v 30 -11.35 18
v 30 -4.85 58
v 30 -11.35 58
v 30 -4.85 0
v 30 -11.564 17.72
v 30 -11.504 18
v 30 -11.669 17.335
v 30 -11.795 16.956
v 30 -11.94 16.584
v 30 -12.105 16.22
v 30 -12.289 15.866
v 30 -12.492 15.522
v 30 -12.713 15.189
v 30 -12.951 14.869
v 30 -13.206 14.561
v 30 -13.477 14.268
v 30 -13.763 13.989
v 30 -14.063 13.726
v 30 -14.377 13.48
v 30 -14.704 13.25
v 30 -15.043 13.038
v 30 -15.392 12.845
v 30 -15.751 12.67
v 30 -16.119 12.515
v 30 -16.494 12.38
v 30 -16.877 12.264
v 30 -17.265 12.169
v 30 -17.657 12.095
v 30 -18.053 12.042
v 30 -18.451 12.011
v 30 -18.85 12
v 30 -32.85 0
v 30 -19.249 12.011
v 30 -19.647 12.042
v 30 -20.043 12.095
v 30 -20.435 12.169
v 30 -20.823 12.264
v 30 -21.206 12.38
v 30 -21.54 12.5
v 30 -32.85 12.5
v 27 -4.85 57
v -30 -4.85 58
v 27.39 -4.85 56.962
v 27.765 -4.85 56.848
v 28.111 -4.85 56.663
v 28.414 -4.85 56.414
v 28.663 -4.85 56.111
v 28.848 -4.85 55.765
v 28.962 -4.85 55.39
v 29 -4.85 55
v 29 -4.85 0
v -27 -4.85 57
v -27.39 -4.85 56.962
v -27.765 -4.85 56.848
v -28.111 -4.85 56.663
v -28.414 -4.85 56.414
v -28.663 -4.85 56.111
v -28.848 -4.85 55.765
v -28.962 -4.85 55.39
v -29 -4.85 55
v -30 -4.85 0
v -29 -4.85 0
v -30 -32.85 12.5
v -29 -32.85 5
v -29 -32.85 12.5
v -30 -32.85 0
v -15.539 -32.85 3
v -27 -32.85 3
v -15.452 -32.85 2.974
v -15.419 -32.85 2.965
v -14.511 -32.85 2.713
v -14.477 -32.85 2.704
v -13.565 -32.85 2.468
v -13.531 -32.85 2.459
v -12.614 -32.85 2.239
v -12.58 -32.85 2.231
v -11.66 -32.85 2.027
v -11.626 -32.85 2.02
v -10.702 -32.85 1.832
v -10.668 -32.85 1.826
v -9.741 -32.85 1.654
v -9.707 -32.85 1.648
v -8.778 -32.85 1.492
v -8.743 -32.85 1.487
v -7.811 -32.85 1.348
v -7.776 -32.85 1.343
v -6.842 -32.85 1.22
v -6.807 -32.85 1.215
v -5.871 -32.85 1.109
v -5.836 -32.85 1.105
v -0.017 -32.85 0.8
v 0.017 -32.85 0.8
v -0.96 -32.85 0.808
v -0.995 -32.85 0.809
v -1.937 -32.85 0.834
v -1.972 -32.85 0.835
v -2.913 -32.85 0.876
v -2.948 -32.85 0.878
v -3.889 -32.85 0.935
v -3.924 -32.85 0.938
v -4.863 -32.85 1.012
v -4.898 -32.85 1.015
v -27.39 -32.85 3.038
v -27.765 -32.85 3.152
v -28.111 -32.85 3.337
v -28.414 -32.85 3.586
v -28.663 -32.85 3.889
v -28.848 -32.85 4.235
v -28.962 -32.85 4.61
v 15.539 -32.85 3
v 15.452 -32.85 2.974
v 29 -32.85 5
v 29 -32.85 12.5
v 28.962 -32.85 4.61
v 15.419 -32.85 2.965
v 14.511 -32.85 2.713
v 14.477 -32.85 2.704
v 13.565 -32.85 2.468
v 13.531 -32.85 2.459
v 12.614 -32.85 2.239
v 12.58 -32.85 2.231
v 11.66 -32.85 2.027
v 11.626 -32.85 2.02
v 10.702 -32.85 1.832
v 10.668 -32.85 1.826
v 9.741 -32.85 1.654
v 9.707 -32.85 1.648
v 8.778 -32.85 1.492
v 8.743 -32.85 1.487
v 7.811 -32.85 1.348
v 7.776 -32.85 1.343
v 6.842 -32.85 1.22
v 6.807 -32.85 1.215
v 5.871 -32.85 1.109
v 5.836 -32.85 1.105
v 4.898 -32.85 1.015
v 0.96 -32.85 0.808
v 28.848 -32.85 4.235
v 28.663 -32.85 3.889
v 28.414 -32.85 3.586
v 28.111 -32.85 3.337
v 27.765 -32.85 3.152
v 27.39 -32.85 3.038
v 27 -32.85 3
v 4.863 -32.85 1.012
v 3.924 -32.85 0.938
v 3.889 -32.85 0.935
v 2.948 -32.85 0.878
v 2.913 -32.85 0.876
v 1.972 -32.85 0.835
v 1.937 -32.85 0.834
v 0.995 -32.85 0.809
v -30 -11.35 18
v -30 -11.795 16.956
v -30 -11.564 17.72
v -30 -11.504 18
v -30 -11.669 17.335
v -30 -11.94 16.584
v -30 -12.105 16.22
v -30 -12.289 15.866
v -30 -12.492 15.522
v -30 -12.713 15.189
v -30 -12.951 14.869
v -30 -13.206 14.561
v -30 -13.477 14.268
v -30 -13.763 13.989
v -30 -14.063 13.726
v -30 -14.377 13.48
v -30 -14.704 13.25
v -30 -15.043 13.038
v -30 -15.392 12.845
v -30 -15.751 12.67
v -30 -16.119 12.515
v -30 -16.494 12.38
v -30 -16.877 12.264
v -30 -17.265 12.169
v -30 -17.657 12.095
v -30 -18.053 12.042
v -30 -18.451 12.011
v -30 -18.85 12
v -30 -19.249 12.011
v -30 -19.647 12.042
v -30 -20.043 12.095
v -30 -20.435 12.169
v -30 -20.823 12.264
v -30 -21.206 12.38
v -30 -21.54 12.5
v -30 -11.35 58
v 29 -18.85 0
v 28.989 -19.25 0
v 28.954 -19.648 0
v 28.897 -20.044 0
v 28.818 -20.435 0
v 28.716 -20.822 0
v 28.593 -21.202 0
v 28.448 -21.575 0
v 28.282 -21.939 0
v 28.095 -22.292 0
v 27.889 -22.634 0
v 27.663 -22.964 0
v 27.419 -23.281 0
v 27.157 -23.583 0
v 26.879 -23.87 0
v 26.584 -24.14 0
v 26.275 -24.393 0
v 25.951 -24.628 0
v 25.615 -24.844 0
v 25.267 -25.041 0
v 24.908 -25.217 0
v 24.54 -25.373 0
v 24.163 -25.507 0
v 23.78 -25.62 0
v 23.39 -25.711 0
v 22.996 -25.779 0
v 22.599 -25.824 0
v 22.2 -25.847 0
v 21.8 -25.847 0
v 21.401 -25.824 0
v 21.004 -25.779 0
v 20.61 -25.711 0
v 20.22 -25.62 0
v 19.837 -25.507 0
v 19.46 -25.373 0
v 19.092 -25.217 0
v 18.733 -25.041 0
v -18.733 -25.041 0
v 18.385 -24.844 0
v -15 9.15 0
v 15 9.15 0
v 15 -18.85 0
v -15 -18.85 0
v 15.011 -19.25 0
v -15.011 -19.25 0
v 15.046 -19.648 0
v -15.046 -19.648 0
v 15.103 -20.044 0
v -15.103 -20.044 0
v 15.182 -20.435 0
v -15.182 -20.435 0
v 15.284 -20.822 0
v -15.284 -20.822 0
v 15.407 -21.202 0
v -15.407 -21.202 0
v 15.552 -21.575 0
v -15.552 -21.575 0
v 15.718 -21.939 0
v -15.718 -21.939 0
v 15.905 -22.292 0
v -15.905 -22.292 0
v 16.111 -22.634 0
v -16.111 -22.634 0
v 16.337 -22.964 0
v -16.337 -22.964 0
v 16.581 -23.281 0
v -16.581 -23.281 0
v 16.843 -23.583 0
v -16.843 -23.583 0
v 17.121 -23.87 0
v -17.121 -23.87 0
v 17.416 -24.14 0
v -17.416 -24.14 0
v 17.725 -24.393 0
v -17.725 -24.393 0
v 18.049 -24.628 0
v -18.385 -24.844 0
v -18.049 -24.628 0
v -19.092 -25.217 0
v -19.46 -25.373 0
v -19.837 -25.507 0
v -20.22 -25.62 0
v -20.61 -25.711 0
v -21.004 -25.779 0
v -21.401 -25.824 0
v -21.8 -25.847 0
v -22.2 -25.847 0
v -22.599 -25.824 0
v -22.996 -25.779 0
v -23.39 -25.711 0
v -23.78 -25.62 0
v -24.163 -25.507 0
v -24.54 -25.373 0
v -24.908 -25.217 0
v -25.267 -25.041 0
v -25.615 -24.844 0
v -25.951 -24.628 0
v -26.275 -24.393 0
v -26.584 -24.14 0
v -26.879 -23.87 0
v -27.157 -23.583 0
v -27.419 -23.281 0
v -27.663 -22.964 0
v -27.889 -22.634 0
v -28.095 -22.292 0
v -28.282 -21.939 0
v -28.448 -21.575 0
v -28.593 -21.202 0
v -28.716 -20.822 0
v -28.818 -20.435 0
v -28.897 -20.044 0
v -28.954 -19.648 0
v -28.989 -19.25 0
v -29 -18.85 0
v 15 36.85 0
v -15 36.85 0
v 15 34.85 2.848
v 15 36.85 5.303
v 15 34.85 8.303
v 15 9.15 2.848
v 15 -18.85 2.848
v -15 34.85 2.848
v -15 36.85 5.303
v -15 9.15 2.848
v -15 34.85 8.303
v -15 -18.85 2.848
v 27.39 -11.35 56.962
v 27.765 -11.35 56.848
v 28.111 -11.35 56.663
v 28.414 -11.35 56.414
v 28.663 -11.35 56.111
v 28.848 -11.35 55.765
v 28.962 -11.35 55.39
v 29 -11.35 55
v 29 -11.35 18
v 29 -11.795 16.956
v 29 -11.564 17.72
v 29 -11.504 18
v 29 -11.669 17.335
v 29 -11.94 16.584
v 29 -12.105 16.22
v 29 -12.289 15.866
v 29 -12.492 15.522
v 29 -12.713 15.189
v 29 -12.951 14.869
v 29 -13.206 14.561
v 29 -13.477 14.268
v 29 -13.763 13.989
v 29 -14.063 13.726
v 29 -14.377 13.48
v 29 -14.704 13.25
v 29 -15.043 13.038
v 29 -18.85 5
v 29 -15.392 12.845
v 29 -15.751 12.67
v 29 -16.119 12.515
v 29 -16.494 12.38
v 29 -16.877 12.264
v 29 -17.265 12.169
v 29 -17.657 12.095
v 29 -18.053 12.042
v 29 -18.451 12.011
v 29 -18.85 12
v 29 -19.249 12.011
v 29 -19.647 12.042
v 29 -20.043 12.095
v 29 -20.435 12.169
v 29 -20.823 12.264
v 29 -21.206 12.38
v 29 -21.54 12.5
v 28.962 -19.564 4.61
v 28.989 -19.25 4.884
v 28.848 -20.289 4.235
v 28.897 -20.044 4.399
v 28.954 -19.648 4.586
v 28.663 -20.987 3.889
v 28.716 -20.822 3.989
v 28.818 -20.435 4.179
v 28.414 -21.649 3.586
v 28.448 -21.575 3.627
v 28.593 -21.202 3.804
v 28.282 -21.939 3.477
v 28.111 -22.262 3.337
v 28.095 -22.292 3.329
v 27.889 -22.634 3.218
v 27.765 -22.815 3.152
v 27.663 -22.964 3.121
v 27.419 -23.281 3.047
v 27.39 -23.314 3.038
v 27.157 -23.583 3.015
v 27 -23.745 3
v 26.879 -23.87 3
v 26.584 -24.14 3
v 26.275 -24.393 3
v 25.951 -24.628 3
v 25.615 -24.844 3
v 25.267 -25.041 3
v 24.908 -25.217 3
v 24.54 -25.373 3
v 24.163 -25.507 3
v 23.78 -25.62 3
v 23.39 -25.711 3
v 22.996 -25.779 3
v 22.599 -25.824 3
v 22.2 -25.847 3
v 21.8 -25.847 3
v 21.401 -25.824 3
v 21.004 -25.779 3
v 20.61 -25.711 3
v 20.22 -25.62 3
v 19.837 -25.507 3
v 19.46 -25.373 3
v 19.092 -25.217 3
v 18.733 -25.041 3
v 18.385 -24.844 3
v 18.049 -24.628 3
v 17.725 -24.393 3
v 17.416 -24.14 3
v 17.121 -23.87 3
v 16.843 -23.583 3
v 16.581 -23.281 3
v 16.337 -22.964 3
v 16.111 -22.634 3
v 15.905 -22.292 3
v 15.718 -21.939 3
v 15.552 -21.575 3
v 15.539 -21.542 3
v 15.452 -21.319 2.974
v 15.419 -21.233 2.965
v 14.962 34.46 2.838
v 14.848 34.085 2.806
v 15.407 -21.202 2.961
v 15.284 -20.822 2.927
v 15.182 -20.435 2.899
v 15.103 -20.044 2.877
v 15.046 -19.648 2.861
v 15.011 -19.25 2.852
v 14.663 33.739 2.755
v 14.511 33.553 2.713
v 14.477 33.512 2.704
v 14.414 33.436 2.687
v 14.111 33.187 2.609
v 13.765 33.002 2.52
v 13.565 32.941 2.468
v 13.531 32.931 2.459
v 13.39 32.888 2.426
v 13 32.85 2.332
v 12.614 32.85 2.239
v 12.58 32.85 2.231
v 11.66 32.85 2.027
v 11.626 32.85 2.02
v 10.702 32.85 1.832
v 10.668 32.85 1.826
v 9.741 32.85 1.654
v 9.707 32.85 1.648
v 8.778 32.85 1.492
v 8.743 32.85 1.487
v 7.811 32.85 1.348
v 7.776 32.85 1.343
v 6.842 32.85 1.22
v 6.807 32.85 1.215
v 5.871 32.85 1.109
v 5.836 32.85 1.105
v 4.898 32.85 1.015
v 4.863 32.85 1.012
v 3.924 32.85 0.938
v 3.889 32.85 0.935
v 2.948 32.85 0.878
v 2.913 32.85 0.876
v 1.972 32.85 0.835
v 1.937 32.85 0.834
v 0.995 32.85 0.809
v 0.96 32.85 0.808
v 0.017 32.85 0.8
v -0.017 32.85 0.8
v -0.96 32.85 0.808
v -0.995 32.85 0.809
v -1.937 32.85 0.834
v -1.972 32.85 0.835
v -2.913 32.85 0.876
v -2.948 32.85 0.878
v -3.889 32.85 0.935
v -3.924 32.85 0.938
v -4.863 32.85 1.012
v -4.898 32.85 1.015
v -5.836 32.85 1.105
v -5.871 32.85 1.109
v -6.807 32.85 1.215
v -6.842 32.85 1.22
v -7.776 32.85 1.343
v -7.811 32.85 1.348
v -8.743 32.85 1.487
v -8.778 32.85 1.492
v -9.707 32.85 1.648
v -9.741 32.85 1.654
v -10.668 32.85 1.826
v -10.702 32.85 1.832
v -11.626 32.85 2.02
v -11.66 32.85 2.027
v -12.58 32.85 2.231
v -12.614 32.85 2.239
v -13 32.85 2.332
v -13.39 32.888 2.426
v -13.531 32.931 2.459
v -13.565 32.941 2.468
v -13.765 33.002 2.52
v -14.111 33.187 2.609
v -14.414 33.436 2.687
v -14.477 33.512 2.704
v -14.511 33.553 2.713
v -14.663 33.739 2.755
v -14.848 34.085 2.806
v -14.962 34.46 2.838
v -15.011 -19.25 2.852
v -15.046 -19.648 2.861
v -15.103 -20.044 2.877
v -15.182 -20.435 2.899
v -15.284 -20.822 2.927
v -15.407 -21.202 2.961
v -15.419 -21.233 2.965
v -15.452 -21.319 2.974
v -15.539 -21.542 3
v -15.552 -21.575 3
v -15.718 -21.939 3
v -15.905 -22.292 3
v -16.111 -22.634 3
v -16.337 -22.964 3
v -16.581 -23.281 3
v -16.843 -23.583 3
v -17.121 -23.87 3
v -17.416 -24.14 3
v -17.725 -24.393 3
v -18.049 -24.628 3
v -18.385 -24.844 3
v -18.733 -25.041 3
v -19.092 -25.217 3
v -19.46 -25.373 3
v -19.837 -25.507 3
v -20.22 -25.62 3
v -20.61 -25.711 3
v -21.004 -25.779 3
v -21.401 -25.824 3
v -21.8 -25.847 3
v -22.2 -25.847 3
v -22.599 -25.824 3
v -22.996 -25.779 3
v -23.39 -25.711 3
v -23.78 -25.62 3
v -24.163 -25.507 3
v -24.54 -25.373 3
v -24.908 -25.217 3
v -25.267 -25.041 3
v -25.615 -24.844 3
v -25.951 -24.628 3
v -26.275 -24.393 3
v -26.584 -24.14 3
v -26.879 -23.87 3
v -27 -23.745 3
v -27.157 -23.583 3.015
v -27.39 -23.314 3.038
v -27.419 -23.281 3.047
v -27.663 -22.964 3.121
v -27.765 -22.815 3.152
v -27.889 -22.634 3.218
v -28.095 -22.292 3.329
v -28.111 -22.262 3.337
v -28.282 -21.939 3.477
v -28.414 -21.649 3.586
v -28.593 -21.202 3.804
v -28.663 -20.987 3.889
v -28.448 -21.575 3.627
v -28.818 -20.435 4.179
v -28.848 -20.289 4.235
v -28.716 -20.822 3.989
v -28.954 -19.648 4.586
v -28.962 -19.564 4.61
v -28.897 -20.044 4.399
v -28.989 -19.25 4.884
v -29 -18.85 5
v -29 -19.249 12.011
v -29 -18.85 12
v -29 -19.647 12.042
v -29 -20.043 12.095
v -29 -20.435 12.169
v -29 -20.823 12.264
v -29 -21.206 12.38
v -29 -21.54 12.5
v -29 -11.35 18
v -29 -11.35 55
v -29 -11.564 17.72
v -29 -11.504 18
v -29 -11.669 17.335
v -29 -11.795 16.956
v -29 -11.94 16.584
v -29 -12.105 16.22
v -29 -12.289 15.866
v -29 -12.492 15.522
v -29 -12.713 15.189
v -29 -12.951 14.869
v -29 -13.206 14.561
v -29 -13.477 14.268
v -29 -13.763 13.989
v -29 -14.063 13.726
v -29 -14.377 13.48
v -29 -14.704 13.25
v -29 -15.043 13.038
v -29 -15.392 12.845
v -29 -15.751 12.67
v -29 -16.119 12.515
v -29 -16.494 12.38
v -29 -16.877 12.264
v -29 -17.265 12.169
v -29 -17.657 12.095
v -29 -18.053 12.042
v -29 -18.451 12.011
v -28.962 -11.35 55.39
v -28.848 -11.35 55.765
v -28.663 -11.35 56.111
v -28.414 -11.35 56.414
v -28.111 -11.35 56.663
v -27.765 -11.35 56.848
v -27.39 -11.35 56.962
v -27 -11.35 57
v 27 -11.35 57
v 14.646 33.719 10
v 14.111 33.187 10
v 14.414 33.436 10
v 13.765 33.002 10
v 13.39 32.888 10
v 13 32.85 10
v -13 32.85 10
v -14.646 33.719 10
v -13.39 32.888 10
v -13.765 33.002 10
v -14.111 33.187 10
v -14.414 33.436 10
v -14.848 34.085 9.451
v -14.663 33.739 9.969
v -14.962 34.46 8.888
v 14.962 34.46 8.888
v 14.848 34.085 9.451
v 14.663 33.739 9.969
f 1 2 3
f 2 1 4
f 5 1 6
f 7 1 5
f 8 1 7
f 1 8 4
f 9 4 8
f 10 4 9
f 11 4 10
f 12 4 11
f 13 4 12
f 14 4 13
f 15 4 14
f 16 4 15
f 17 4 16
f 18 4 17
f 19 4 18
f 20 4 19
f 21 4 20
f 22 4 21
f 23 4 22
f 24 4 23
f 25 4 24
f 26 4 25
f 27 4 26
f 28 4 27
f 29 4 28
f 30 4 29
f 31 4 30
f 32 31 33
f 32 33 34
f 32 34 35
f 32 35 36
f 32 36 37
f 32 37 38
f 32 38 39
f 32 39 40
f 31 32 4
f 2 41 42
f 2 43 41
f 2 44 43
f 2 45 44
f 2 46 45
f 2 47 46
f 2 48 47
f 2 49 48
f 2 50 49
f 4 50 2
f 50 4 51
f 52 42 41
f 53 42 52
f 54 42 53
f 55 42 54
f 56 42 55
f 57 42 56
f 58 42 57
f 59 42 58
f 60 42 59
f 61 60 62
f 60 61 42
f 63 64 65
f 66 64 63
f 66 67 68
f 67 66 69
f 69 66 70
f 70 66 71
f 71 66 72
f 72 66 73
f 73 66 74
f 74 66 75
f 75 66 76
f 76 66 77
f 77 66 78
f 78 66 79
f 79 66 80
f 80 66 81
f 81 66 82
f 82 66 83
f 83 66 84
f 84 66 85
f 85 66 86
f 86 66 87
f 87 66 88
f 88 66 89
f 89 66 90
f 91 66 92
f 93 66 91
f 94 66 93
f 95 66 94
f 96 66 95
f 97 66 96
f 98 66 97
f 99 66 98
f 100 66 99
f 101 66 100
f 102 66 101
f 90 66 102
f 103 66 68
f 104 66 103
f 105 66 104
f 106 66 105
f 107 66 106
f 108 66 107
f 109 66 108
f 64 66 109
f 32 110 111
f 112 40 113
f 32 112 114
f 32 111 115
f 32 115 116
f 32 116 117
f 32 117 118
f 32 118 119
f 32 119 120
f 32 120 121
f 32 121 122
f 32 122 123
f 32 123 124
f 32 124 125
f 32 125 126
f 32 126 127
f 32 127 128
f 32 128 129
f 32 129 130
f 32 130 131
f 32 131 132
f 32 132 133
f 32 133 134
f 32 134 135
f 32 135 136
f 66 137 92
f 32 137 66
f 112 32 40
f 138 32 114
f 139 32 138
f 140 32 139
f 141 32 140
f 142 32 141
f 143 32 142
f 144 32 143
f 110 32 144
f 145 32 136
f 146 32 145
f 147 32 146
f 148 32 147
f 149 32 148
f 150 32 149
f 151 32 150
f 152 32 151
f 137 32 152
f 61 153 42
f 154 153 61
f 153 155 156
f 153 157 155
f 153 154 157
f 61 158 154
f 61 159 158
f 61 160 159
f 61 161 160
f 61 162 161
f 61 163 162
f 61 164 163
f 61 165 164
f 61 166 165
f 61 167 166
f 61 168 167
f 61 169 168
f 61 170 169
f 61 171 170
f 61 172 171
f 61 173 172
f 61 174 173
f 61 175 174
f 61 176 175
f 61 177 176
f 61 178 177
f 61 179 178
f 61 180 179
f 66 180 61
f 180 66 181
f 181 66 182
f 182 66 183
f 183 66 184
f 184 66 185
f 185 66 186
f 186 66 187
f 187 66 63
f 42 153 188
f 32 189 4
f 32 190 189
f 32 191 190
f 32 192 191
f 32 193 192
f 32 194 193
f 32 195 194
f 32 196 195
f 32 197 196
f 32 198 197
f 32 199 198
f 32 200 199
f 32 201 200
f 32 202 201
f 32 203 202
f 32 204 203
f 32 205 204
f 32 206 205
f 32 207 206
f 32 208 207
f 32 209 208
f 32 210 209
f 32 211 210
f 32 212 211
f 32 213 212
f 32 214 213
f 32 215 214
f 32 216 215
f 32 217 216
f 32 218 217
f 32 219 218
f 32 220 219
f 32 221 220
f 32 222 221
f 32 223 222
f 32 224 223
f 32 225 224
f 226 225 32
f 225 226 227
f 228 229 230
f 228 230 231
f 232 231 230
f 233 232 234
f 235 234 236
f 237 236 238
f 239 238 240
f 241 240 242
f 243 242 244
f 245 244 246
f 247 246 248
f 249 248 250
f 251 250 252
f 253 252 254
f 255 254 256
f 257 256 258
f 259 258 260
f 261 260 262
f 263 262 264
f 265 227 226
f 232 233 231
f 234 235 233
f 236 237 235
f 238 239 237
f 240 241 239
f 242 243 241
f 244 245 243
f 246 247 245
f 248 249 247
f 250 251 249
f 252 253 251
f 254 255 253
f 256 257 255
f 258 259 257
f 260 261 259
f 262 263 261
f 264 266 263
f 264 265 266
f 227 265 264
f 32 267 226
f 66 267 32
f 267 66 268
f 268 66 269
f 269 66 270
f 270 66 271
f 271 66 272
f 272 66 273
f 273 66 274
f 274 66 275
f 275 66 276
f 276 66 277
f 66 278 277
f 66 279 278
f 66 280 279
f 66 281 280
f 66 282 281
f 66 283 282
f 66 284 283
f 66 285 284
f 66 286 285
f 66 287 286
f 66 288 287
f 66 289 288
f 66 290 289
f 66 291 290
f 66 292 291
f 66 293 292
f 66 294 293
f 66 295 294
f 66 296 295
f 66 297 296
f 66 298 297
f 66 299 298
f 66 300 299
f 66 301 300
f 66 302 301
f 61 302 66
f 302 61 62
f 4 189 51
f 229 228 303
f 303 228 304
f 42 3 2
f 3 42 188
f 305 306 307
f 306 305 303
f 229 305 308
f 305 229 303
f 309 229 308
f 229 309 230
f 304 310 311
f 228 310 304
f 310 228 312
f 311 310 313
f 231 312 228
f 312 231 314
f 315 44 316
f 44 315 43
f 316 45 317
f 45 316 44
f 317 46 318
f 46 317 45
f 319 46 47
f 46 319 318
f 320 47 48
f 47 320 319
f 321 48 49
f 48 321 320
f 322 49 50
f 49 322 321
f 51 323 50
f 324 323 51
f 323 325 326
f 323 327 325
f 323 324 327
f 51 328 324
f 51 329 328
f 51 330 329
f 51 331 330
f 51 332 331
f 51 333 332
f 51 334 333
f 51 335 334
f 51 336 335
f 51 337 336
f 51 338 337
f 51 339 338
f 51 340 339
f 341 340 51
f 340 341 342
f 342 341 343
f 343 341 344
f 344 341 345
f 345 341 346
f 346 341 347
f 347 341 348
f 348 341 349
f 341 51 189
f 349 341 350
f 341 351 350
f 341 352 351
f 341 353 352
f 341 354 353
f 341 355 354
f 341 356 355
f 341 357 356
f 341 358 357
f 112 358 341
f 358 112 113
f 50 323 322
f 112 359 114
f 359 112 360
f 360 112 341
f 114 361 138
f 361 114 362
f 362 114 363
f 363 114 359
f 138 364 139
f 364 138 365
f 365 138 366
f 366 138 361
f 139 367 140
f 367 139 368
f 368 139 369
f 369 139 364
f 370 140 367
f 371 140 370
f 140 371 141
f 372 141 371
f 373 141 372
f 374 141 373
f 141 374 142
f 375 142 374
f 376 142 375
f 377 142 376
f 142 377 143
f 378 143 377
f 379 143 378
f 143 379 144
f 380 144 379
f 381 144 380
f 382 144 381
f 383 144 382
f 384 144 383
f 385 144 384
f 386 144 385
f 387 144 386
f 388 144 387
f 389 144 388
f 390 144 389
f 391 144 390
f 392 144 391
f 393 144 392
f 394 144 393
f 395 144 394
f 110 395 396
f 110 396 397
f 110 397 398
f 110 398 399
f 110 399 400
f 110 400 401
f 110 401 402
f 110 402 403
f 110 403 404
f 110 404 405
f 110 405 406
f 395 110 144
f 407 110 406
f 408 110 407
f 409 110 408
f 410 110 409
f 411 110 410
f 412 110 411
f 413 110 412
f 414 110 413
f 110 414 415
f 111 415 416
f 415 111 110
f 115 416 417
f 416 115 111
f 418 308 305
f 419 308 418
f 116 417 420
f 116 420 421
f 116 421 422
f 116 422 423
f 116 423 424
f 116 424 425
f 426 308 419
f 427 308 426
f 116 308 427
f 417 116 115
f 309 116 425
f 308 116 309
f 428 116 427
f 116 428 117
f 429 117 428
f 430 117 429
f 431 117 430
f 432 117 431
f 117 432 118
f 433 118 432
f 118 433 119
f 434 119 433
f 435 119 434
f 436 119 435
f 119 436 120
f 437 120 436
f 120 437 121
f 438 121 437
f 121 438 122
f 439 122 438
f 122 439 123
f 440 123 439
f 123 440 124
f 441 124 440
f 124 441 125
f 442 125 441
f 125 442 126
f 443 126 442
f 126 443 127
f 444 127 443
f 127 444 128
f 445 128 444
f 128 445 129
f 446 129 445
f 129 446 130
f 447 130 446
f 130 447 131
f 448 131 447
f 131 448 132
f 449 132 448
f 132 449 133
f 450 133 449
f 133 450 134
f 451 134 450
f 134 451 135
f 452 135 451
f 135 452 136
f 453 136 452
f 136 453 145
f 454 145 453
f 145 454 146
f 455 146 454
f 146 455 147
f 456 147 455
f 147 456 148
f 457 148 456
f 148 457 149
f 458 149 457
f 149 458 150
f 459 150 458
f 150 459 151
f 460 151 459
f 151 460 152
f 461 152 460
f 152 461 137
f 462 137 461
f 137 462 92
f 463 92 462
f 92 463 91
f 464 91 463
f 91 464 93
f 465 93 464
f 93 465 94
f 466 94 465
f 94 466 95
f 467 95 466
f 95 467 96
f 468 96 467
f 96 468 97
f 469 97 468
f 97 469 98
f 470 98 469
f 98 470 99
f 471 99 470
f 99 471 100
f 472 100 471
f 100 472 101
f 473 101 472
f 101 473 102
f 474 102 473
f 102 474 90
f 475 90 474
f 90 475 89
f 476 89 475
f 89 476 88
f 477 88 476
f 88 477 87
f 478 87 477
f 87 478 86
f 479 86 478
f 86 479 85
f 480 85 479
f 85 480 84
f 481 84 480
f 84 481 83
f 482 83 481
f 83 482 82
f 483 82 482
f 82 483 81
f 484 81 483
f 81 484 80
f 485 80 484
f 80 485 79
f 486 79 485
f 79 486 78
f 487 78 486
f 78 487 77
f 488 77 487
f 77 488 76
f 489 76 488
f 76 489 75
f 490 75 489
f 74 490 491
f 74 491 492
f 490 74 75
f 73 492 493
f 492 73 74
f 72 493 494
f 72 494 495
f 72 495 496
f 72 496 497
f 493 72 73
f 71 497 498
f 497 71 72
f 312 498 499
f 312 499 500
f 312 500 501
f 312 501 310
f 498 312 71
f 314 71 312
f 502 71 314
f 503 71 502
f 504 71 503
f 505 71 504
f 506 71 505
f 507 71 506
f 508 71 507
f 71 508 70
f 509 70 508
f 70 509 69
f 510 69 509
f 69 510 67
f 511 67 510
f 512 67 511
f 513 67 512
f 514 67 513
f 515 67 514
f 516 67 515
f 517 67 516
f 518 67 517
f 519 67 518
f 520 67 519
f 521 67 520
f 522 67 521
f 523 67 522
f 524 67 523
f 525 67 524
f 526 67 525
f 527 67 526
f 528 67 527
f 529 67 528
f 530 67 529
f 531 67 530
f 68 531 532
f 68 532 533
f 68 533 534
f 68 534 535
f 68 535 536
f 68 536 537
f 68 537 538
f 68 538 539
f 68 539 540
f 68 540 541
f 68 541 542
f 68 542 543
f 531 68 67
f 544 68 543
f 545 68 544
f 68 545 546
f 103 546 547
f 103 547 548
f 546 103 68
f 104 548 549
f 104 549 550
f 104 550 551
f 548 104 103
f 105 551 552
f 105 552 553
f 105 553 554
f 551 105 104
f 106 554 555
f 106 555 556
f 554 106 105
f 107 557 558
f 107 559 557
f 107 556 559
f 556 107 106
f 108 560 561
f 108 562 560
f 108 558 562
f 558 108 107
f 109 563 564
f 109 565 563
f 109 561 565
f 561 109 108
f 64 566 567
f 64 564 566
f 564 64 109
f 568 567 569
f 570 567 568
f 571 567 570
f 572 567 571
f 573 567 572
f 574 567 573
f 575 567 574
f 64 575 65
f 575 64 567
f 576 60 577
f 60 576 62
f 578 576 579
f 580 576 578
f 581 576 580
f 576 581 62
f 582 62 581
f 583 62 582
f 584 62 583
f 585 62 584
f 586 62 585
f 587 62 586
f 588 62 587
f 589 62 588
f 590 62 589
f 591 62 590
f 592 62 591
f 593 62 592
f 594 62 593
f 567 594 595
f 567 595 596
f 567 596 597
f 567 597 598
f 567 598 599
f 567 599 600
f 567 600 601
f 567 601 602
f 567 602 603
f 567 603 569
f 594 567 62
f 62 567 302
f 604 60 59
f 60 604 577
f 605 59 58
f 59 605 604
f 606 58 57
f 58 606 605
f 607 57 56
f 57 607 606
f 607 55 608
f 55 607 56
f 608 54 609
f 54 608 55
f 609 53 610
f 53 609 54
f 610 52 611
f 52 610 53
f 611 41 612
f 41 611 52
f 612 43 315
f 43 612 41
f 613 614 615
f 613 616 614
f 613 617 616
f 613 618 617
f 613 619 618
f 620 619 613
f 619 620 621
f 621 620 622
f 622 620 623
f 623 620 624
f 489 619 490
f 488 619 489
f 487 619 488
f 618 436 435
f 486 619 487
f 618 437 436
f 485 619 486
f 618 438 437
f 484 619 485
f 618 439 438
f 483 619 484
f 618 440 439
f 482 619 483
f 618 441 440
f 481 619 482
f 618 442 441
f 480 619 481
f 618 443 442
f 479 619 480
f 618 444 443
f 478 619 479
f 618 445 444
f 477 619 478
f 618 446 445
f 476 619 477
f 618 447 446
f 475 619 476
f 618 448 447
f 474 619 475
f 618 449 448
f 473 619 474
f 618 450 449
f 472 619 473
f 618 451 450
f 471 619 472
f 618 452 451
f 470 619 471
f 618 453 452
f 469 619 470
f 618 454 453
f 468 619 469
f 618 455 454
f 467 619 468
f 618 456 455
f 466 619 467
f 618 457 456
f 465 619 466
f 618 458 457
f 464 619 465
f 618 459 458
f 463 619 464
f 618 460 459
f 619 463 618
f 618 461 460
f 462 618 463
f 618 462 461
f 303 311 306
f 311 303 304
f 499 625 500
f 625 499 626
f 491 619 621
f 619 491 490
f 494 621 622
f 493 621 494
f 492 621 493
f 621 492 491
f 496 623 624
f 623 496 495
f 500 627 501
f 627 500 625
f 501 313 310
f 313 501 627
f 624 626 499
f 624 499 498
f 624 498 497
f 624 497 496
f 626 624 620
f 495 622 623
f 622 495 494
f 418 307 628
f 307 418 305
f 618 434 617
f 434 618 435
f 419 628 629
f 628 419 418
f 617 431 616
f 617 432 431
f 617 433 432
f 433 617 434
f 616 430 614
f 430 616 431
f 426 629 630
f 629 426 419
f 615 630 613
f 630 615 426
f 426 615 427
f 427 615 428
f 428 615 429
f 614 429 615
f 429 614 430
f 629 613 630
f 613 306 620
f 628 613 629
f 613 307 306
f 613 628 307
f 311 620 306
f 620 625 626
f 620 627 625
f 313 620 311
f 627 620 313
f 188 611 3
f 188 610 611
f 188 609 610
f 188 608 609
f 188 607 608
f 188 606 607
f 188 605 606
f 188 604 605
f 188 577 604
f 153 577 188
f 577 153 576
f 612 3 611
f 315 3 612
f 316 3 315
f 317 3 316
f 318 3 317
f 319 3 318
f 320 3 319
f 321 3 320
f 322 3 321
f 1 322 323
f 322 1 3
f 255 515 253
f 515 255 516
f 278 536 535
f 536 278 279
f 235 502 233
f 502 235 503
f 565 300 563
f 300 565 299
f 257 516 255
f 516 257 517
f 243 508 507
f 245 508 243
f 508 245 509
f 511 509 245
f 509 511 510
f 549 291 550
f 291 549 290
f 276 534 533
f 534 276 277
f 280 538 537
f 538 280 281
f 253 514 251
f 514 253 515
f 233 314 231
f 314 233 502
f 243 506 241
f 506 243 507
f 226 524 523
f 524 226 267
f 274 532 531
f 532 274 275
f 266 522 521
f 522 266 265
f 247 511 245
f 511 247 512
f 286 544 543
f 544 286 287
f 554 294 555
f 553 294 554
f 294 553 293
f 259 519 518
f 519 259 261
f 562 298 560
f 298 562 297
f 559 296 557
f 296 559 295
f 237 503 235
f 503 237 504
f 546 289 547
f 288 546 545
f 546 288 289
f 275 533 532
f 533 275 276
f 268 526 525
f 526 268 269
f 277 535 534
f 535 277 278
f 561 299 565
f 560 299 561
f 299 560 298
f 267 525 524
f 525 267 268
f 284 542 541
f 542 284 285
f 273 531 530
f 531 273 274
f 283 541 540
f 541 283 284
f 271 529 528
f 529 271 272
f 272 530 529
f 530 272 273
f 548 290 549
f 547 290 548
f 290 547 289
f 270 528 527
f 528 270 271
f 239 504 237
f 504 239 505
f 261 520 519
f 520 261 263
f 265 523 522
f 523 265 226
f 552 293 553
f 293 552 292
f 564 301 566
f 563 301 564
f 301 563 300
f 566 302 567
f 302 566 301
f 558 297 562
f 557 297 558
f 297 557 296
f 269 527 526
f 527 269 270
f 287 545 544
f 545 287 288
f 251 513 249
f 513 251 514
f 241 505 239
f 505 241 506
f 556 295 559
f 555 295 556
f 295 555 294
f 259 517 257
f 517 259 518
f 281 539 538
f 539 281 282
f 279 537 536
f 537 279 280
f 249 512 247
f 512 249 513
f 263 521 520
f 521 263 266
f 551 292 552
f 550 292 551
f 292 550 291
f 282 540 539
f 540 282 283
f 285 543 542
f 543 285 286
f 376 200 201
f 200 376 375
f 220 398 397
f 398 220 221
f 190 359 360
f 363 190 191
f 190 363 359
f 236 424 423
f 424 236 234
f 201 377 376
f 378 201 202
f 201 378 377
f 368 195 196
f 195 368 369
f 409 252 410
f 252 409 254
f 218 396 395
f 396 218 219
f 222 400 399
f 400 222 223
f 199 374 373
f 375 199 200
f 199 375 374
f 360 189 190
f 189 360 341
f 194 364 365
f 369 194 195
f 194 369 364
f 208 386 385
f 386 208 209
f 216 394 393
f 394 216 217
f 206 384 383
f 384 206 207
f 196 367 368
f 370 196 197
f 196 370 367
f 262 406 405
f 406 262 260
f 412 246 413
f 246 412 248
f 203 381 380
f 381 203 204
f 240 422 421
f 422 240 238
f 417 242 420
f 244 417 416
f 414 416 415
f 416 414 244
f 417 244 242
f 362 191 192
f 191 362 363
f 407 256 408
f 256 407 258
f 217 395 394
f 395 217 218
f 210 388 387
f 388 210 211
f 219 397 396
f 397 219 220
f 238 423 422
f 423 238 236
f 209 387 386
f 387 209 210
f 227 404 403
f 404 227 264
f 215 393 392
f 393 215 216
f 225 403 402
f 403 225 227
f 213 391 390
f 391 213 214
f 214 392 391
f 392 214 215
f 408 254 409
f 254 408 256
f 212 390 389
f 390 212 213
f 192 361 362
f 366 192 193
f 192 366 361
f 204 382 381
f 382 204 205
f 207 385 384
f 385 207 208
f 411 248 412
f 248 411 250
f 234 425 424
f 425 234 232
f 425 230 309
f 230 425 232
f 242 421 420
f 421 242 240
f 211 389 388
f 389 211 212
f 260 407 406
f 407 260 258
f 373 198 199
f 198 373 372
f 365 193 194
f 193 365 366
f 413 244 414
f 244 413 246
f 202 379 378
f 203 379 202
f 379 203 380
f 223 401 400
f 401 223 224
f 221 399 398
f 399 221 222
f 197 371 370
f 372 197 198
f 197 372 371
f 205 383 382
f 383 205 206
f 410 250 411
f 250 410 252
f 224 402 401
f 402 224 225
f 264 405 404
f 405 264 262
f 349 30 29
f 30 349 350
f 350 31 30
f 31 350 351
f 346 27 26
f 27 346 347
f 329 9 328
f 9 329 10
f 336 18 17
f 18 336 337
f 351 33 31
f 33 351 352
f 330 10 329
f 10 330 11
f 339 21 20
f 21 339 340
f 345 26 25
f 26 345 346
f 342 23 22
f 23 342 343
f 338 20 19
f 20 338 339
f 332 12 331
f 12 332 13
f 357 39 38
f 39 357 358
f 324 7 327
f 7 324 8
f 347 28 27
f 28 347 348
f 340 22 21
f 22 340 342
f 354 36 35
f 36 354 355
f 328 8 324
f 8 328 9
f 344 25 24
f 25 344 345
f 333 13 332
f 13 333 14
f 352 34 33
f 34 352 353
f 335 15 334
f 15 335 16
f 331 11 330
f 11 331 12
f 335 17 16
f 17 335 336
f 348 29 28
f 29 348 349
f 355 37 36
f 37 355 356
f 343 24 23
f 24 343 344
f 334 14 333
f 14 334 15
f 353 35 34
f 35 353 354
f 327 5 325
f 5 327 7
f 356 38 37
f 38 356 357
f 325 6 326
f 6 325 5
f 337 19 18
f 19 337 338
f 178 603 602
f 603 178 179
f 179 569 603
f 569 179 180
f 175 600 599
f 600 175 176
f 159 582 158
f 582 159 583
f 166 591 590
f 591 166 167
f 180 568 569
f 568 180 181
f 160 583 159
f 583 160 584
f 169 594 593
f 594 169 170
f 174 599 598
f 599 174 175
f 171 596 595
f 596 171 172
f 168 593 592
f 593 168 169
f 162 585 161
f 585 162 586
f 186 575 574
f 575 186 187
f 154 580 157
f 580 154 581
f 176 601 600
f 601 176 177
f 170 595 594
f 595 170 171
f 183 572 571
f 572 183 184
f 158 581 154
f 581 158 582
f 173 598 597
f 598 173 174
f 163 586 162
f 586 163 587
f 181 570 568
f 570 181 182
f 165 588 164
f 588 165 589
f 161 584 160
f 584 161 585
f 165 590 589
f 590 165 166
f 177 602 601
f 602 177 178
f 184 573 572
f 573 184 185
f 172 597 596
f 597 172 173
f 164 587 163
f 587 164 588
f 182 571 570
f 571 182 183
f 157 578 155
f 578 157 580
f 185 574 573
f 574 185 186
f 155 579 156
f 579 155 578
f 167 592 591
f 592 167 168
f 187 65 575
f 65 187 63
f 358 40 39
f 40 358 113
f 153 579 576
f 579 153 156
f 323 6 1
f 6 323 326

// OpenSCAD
// SPDX-FileCopyrightText: 2023 Carnegie Mellon University - Satyalab
//
// SPDX-License-Identifier: GPL-2.0-only

$fa = 1;
$fs = 0.4;

module example() {
    color(c=[0, 0, 1, 0.5])
    translate([0, 30, -27.9])
    rotate([90, 0, 0])
    import("body_clip.stl");
}

module battery_shape(battery_width, battery_height) {
    offset(r=2) {
        square([battery_width-4, battery_height-4], center=true);
        intersection() {
            translate([0, 0.2-battery_height/2, 0])
            circle(r=battery_height);
            translate([0, 3, 0])
            square([battery_width-4, battery_height-4], center=true);
        }
    }
}

module collar_and_neck(battery_width, battery_height, neck_length, collar_width, clip_width, clip_depth, wall_thickness) {
    clip_thickness = 4;
    width = battery_width + wall_thickness*2;
    height = battery_height + wall_thickness*2 + 2;
    neck_height = collar_width + neck_length + clip_thickness;
    clip_height = clip_depth + wall_thickness + 2;

    difference() {
        union() {
            // collar
            translate([0, 1, collar_width/2])
            cube([width, height, collar_width], center=true);
            // neck
            translate([-clip_width/2, battery_height/2, 0])
            cube([clip_width, wall_thickness+2, neck_height]);
        }

        translate([0, 0, -1]) linear_extrude(neck_height) {
            battery_shape(battery_width, battery_height);
        };
    }

    // clip
    r = clip_thickness/2;
    translate([0, battery_height/2+wall_thickness+2, neck_height-r])
    rotate([90, 0, 0])
    difference() {
        union() {
            translate([r-clip_width/2, -r, 0])
            cube([clip_width-2*r, r, clip_height]);
            translate([-clip_width/2, 0, 0])
            cube([clip_width, r, clip_height]);
            translate([r-clip_width/2, 0, 0])
            cylinder(h=clip_height, r=r);
            translate([clip_width/2-r, 0, 0])
            cylinder(h=clip_height, r=r);
        }
        translate([0, 0, wall_thickness+5.5])
        rotate([33.69, 0, 0])
        translate([0, 6, 0])
        cube([battery_width, 10, 20], center=true);
    }
}

module gap(battery_width, clip_width, collar_width, wall_thickness, offset) {
    gap_width = (battery_width - clip_width) / 2;
    translate([offset*(gap_width+clip_width)/2, battery_height/2+wall_thickness*2+2, collar_width/2])
    rotate([90, 0, 0])
    union() {
        cylinder(h=wall_thickness+6, d=gap_width);
        translate([-gap_width/2, 0, 0])
        cube([gap_width, collar_width, wall_thickness+6]);
    }
}

module hole(wall_thickness, hole_width, hole_length=36) {
    coff=(hole_length-hole_width)/2;
    translate([-coff, 0, 0])
    cylinder(h=wall_thickness+4, d=hole_width, center=true);
    translate([coff, 0, 0])
    cylinder(h=wall_thickness+4, d=hole_width, center=true);
    cube([hole_length-hole_width, hole_width, wall_thickness+4], center=true);
}

module drone_body_mount(
    battery_width,
    battery_height,
    neck_length,
    clip_width=30,
    clip_depth=7,
    collar_width=28,
    wall_thickness=4,
    hole_width=15,
    holes="minimal"
) {
    translate([0, -(collar_width+neck_length)/2, 0])
    rotate([-90, 0, 0])
    translate([0, -battery_height/2-wall_thickness-2, 0])
    difference() {
        union() {
            collar_and_neck(battery_width, battery_height, neck_length, collar_width, clip_width, clip_depth, wall_thickness);
            //clip(battery_height, neck_length, collar_width, clip_width, clip_depth, wall_thickness);
        }

        // fan hole
        translate([0, -battery_height/2-2, collar_width/2])
        //translate([0, -battery_height/2-2, (collar_width+neck_length+hole_width)/2])
        rotate([90, 0, 0])
        //hole(wall_thickness, collar_width+neck_length-hole_width);
        hole(wall_thickness, hole_width);

        // hole in neck
        if (holes=="neck" || holes=="everywhere") {
            translate([0, battery_height/2+3, collar_width])
            rotate([90, 90, 0])
            hole(wall_thickness, hole_width, hole_length=neck_length);
        }

        // gaps next to neck
        gap(battery_width, clip_width, collar_width, wall_thickness, -1);
        gap(battery_width, clip_width, collar_width, wall_thickness, 1);

        // side holes
        if (holes=="side" || holes=="everywhere") {
            translate([battery_width/2+2, 0, collar_width/2])
            rotate([90, 0, 90])
            hole(wall_thickness, hole_width);

            translate([-battery_width/2-2, 0, collar_width/2])
            rotate([90, 0, 90])
            hole(wall_thickness, hole_width);
        }

        // extreme cut
        translate([0, -9.5, 0])
        cube([battery_width+10, battery_height, collar_width], center=true);
        translate([0, -hole_width, hole_width/2])
        cube([battery_width+10, battery_height, collar_width], center=true);
    };
}

//example();

// Parrot Anafi
battery_width = 45;
battery_height = 50;
neck_length = 37.7;

// Parrot Anafi USA
battery_width = 58;
battery_height = 54;
neck_length = 37.7;

/*
    holes="neck"
    holes="side"
    holes="everywhere"
*/
drone_body_mount(battery_width, battery_height, neck_length, holes="side", wall_thickness=1);

//example();
